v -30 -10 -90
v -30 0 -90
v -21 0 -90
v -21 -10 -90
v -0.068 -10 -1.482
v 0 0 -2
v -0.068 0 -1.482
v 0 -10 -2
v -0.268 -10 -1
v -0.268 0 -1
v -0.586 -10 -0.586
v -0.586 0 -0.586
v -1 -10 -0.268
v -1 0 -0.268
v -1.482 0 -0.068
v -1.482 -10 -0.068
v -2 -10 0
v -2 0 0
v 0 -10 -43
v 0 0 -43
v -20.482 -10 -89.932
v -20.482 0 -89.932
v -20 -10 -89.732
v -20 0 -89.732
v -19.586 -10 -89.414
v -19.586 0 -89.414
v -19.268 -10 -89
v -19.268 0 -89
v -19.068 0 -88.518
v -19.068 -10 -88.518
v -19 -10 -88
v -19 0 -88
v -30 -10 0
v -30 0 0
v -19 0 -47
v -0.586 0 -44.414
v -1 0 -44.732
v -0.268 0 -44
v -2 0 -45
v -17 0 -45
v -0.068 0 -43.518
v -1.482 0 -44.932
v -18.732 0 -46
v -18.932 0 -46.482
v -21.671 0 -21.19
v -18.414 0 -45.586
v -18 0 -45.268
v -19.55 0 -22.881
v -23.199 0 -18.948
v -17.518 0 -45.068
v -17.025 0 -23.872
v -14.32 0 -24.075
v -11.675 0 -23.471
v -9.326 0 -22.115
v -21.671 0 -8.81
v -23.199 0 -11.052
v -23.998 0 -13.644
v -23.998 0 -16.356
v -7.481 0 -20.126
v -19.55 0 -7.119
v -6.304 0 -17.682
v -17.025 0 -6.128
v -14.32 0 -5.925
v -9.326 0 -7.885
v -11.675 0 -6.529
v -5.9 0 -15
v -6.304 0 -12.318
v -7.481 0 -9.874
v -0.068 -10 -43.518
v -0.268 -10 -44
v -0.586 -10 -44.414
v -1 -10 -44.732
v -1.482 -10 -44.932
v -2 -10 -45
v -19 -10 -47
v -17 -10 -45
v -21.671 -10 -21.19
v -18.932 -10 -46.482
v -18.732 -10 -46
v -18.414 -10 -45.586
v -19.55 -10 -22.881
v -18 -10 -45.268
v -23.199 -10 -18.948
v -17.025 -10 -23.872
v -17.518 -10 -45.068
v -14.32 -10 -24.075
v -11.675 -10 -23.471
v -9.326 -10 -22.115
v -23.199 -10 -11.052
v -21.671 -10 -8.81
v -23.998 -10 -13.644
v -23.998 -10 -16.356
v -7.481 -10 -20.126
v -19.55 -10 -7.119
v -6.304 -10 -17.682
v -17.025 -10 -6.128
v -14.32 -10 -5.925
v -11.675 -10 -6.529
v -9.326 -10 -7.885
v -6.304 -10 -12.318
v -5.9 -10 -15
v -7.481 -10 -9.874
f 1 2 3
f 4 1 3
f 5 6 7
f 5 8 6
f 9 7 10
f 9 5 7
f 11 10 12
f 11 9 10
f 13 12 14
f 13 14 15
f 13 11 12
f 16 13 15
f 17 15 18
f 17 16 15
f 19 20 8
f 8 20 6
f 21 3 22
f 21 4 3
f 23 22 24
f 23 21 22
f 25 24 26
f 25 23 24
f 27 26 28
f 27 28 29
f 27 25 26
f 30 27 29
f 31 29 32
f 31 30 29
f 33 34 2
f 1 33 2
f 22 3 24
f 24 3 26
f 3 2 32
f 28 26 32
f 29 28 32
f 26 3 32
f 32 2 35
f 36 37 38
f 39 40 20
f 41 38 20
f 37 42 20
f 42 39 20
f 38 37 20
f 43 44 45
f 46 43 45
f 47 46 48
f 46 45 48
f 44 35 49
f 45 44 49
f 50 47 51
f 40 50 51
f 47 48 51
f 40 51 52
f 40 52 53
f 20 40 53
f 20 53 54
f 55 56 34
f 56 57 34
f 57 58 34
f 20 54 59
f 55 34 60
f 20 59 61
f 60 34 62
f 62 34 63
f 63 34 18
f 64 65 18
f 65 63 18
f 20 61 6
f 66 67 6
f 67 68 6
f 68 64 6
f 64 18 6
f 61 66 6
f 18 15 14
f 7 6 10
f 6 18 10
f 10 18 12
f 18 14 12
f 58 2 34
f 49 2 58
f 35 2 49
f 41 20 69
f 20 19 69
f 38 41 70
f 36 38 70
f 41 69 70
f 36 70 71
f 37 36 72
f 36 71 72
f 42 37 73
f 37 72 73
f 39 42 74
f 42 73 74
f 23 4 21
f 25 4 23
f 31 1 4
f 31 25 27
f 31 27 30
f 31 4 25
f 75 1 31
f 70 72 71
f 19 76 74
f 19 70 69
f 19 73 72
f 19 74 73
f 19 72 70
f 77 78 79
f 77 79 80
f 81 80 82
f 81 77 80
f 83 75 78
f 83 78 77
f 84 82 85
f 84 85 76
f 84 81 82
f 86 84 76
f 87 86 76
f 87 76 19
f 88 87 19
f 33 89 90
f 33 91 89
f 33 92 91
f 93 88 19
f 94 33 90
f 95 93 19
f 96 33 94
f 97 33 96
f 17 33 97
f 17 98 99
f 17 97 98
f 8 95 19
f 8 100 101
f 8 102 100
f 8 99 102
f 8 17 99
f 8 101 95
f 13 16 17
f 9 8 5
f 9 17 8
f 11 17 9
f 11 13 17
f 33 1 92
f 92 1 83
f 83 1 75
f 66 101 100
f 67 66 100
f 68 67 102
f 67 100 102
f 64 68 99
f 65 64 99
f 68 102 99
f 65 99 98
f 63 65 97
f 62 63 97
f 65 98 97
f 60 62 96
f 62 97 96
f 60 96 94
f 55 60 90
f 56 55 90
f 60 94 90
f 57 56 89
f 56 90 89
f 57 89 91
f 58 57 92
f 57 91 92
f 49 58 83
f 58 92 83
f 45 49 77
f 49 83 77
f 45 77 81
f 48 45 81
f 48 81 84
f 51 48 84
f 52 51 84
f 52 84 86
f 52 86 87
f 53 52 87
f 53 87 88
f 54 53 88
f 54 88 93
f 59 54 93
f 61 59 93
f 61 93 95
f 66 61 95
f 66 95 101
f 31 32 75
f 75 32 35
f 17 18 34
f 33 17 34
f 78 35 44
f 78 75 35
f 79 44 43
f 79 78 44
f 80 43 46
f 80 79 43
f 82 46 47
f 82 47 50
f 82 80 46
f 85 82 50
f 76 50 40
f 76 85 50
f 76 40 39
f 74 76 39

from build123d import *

# Parameters (mm, degrees)
F1_DEPTH = 10
F2_R     = 2
F3_R     = 9.1
F4_DEPTH = 25


with BuildPart() as f1:
    # F0 (on Front) → F1 (new body)
    with BuildSketch(Plane.XZ):
        Polygon((0, -45), (0, 0), (-30, 0), (-30, -90), (-19, -90), (-19, -45), align=None)
    extrude(amount=F1_DEPTH)

    # F2
    f2_edges = [f1.edges().sort_by_distance(p)[0] for p in [
        (-19, -5, -90),
        (0, -5, -45),
        (-19, -5, -45),
        (0, -5, 0),
    ]]
    fillet(f2_edges, radius=F2_R)

    # F3 (on face) → F4 (cut)
    with BuildSketch(Plane.XZ.offset(10)):
        with Locations((-15, -15)):
            Circle(F3_R)
    extrude(amount=-F4_DEPTH, mode=Mode.SUBTRACT)


solid = f1.part
